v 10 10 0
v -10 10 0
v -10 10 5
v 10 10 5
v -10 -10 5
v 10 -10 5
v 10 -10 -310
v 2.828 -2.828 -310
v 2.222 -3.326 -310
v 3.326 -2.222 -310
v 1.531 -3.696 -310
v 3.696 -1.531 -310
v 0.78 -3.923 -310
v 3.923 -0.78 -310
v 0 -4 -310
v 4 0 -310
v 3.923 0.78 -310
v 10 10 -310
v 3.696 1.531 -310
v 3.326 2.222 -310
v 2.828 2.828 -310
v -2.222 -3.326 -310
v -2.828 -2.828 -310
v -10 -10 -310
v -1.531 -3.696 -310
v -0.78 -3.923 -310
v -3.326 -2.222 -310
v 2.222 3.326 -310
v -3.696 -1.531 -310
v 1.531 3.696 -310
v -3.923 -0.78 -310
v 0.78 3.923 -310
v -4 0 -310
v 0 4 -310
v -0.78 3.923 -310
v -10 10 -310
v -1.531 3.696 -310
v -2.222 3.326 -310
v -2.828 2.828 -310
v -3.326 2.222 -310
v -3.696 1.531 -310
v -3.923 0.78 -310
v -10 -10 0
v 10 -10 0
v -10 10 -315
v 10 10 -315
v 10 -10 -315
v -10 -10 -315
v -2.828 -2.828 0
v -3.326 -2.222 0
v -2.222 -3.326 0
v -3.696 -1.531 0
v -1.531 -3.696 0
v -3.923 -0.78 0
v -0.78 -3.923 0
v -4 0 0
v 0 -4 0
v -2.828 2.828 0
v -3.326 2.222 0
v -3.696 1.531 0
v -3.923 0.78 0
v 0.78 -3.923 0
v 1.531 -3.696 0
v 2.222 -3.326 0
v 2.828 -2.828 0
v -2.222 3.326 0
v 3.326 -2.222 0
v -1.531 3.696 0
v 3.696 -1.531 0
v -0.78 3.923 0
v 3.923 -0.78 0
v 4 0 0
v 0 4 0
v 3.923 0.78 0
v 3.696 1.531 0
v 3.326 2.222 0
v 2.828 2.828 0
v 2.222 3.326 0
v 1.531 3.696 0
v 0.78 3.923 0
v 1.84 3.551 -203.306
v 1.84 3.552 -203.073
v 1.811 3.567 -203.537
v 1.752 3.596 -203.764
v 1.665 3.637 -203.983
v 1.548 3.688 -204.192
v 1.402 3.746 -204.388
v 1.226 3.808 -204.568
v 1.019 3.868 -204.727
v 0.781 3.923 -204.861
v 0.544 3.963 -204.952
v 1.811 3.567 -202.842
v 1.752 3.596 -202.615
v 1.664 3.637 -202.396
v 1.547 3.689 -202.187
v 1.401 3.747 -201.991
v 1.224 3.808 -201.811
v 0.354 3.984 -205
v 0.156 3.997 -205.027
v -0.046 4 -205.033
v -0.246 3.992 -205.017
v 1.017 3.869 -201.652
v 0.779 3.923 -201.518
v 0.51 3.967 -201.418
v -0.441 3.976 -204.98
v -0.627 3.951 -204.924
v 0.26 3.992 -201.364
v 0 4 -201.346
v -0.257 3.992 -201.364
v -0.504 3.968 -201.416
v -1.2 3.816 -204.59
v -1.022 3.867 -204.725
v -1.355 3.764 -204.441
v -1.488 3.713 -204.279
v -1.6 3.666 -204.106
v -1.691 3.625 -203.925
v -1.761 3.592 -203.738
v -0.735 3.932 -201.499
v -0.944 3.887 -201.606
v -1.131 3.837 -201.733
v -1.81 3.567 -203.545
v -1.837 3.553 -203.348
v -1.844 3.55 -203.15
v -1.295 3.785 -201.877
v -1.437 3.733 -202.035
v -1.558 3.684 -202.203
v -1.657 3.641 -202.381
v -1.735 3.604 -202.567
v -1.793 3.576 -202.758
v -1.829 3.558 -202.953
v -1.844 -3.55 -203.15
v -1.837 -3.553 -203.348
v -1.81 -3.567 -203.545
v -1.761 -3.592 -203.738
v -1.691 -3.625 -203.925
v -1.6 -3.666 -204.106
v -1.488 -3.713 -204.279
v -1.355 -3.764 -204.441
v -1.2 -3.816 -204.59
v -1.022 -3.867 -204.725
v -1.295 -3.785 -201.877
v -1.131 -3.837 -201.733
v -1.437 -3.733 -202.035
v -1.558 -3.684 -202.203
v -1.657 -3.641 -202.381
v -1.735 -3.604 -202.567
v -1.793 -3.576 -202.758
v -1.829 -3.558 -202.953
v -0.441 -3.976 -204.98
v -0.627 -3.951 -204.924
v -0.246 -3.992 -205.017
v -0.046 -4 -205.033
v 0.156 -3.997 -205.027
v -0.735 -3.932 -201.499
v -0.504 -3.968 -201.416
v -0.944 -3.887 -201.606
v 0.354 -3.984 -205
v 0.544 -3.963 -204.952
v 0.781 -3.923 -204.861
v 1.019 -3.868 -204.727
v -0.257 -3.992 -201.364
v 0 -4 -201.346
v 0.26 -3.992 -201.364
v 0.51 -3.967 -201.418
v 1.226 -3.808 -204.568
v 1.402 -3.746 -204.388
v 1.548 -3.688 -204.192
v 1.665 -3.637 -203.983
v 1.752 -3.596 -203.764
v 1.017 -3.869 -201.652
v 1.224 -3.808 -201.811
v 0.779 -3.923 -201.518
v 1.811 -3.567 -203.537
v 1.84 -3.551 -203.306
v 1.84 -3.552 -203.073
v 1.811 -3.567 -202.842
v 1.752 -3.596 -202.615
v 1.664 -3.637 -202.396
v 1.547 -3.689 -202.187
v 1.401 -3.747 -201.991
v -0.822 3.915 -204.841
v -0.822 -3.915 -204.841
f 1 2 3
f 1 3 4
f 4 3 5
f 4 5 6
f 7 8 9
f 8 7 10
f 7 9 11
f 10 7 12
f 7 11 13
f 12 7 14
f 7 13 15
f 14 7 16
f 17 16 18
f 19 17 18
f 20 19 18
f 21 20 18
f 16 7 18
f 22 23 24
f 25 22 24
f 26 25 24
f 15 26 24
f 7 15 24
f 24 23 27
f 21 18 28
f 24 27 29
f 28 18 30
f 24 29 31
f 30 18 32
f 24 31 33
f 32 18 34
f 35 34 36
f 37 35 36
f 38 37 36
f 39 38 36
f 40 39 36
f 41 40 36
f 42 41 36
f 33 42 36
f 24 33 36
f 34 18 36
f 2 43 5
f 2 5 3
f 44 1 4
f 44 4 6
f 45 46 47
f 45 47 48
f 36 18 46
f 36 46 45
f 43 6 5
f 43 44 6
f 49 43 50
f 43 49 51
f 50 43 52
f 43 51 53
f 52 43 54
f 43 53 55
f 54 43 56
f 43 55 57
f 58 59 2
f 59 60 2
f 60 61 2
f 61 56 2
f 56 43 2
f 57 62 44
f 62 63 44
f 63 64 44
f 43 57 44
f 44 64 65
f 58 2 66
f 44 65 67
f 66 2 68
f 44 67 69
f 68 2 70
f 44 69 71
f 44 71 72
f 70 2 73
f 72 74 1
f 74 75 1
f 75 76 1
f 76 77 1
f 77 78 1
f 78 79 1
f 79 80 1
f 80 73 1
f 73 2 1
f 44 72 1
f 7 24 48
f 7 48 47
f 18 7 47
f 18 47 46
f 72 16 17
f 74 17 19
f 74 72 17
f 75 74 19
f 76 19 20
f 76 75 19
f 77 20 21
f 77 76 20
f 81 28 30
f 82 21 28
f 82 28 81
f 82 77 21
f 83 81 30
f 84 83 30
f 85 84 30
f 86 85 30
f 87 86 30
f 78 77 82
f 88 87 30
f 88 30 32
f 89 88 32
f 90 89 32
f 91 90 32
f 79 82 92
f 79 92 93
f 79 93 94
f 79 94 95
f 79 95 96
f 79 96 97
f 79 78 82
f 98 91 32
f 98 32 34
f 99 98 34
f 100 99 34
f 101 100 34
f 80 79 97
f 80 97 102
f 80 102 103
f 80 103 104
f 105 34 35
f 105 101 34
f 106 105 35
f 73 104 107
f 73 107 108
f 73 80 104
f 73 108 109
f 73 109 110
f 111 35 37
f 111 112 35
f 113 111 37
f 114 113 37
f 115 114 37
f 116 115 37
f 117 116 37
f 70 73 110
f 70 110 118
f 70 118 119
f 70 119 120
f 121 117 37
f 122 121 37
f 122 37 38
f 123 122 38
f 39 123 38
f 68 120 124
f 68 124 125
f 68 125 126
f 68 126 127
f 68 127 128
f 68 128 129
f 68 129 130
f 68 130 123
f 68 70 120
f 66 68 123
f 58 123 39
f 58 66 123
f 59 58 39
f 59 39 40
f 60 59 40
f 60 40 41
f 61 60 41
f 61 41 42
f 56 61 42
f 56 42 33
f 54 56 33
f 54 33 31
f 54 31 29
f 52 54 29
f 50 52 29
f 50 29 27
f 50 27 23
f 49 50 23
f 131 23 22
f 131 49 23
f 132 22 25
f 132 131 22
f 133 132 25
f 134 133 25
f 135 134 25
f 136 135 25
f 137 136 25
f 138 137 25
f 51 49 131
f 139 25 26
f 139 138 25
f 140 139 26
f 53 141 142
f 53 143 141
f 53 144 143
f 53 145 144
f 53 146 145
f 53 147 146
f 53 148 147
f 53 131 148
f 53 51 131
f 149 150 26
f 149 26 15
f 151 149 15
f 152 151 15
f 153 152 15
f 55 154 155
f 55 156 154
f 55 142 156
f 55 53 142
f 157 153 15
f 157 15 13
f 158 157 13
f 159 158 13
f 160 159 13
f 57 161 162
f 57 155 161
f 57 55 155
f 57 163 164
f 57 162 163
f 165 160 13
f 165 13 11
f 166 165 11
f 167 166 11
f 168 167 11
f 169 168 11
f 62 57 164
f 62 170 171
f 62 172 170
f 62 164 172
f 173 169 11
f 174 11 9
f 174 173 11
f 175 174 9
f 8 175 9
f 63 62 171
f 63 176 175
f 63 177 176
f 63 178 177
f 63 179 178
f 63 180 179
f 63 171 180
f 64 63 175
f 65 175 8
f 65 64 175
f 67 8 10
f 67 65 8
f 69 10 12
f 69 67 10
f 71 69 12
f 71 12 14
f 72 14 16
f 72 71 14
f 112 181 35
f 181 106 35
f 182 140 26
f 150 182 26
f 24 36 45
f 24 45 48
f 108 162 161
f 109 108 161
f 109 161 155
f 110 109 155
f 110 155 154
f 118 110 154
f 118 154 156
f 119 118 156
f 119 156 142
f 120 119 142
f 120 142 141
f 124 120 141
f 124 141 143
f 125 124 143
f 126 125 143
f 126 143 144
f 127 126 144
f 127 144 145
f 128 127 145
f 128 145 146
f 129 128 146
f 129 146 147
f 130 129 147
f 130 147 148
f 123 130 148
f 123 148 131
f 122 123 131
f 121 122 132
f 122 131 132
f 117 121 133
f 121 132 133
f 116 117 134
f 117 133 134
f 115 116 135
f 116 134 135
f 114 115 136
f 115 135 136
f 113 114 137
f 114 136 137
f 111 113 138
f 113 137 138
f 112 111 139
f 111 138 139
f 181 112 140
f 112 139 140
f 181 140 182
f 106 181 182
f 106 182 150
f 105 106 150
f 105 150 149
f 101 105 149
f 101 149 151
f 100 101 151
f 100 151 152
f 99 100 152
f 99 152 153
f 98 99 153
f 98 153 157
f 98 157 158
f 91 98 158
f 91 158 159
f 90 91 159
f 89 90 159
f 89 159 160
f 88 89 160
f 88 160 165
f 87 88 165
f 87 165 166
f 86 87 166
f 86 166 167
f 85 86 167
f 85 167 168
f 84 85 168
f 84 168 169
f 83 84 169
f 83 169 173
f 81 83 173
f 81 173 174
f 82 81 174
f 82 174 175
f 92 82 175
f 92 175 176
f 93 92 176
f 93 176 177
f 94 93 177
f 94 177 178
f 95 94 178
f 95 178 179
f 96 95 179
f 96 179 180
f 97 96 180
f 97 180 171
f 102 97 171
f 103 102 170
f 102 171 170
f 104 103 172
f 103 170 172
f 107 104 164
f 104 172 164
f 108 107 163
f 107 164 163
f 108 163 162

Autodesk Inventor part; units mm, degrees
ref_plane "YZ Plane" through (0, 0, 0) normal (1, 0, 0) x (0, 1, 0)
sketch "Sketch3" plane through (0, 0, 0) normal (0, 0, 1) x (1, 0, 0)
  circle A0 centre (0, 0) radius 4
  dimension "d11" = 8
extrude "Extrusion5" add sketch "Sketch3" against normal blind 310
sketch "Sketch4" plane through (0, 0, 0) normal (0, 0, 1) x (1, 0, 0)
  line L0 (-10, 10) -> (10, 10)
  line L1 (10, 10) -> (10, -10)
  line L2 (10, -10) -> (-10, -10)
  line L3 (-10, -10) -> (-10, 10)
  line L4 (-10, 10) -> (10, -10) construction
  line L5 (10, 10) -> (-10, -10) construction
  point P0 (0, 0)
  dimension "d17" = 20
  dimension "d18" = 20
extrude "Extrusion6" add sketch "Sketch4" along normal blind 5
ref_plane "Work Plane4" through (0, 0, -155) normal (0, 0, -1) x (-1, 0, 0)
mirror "Mirror1" about plane through (0, 0, -155) normal (0, 0, -1) of "Extrusion6"
ref_plane "Work Plane6" through (10, 10, -315) normal (0, -1, 0) x (-1, 0, 0)
ref_plane "Work Plane5" through (10, -10, -203.19) normal (0, 0, -1) x (-1, 0, 0)
sketch "Sketch5" plane through (10, 10, -315) normal (0, -1, 0) x (-1, 0, 0)
  line L0 (-4, -111.81) -> (24, -111.81) construction
  line L1 (14, -5) -> (6, -5) construction
  line L2 (6, -315) -> (14, -315) construction
  line L3 (0, -5) -> (20, -5) construction
  line L4 (10, -5) -> (10, -315) construction
  line L5 (6, -315) -> (6, -5) construction
  point P0 (10, -111.81)
hole "Hole1" at (0, 10, -203.19) direction (0, -1, 0) diameter 3.688 end through all
properties part number "rear axle" material "Steel, Mild"
